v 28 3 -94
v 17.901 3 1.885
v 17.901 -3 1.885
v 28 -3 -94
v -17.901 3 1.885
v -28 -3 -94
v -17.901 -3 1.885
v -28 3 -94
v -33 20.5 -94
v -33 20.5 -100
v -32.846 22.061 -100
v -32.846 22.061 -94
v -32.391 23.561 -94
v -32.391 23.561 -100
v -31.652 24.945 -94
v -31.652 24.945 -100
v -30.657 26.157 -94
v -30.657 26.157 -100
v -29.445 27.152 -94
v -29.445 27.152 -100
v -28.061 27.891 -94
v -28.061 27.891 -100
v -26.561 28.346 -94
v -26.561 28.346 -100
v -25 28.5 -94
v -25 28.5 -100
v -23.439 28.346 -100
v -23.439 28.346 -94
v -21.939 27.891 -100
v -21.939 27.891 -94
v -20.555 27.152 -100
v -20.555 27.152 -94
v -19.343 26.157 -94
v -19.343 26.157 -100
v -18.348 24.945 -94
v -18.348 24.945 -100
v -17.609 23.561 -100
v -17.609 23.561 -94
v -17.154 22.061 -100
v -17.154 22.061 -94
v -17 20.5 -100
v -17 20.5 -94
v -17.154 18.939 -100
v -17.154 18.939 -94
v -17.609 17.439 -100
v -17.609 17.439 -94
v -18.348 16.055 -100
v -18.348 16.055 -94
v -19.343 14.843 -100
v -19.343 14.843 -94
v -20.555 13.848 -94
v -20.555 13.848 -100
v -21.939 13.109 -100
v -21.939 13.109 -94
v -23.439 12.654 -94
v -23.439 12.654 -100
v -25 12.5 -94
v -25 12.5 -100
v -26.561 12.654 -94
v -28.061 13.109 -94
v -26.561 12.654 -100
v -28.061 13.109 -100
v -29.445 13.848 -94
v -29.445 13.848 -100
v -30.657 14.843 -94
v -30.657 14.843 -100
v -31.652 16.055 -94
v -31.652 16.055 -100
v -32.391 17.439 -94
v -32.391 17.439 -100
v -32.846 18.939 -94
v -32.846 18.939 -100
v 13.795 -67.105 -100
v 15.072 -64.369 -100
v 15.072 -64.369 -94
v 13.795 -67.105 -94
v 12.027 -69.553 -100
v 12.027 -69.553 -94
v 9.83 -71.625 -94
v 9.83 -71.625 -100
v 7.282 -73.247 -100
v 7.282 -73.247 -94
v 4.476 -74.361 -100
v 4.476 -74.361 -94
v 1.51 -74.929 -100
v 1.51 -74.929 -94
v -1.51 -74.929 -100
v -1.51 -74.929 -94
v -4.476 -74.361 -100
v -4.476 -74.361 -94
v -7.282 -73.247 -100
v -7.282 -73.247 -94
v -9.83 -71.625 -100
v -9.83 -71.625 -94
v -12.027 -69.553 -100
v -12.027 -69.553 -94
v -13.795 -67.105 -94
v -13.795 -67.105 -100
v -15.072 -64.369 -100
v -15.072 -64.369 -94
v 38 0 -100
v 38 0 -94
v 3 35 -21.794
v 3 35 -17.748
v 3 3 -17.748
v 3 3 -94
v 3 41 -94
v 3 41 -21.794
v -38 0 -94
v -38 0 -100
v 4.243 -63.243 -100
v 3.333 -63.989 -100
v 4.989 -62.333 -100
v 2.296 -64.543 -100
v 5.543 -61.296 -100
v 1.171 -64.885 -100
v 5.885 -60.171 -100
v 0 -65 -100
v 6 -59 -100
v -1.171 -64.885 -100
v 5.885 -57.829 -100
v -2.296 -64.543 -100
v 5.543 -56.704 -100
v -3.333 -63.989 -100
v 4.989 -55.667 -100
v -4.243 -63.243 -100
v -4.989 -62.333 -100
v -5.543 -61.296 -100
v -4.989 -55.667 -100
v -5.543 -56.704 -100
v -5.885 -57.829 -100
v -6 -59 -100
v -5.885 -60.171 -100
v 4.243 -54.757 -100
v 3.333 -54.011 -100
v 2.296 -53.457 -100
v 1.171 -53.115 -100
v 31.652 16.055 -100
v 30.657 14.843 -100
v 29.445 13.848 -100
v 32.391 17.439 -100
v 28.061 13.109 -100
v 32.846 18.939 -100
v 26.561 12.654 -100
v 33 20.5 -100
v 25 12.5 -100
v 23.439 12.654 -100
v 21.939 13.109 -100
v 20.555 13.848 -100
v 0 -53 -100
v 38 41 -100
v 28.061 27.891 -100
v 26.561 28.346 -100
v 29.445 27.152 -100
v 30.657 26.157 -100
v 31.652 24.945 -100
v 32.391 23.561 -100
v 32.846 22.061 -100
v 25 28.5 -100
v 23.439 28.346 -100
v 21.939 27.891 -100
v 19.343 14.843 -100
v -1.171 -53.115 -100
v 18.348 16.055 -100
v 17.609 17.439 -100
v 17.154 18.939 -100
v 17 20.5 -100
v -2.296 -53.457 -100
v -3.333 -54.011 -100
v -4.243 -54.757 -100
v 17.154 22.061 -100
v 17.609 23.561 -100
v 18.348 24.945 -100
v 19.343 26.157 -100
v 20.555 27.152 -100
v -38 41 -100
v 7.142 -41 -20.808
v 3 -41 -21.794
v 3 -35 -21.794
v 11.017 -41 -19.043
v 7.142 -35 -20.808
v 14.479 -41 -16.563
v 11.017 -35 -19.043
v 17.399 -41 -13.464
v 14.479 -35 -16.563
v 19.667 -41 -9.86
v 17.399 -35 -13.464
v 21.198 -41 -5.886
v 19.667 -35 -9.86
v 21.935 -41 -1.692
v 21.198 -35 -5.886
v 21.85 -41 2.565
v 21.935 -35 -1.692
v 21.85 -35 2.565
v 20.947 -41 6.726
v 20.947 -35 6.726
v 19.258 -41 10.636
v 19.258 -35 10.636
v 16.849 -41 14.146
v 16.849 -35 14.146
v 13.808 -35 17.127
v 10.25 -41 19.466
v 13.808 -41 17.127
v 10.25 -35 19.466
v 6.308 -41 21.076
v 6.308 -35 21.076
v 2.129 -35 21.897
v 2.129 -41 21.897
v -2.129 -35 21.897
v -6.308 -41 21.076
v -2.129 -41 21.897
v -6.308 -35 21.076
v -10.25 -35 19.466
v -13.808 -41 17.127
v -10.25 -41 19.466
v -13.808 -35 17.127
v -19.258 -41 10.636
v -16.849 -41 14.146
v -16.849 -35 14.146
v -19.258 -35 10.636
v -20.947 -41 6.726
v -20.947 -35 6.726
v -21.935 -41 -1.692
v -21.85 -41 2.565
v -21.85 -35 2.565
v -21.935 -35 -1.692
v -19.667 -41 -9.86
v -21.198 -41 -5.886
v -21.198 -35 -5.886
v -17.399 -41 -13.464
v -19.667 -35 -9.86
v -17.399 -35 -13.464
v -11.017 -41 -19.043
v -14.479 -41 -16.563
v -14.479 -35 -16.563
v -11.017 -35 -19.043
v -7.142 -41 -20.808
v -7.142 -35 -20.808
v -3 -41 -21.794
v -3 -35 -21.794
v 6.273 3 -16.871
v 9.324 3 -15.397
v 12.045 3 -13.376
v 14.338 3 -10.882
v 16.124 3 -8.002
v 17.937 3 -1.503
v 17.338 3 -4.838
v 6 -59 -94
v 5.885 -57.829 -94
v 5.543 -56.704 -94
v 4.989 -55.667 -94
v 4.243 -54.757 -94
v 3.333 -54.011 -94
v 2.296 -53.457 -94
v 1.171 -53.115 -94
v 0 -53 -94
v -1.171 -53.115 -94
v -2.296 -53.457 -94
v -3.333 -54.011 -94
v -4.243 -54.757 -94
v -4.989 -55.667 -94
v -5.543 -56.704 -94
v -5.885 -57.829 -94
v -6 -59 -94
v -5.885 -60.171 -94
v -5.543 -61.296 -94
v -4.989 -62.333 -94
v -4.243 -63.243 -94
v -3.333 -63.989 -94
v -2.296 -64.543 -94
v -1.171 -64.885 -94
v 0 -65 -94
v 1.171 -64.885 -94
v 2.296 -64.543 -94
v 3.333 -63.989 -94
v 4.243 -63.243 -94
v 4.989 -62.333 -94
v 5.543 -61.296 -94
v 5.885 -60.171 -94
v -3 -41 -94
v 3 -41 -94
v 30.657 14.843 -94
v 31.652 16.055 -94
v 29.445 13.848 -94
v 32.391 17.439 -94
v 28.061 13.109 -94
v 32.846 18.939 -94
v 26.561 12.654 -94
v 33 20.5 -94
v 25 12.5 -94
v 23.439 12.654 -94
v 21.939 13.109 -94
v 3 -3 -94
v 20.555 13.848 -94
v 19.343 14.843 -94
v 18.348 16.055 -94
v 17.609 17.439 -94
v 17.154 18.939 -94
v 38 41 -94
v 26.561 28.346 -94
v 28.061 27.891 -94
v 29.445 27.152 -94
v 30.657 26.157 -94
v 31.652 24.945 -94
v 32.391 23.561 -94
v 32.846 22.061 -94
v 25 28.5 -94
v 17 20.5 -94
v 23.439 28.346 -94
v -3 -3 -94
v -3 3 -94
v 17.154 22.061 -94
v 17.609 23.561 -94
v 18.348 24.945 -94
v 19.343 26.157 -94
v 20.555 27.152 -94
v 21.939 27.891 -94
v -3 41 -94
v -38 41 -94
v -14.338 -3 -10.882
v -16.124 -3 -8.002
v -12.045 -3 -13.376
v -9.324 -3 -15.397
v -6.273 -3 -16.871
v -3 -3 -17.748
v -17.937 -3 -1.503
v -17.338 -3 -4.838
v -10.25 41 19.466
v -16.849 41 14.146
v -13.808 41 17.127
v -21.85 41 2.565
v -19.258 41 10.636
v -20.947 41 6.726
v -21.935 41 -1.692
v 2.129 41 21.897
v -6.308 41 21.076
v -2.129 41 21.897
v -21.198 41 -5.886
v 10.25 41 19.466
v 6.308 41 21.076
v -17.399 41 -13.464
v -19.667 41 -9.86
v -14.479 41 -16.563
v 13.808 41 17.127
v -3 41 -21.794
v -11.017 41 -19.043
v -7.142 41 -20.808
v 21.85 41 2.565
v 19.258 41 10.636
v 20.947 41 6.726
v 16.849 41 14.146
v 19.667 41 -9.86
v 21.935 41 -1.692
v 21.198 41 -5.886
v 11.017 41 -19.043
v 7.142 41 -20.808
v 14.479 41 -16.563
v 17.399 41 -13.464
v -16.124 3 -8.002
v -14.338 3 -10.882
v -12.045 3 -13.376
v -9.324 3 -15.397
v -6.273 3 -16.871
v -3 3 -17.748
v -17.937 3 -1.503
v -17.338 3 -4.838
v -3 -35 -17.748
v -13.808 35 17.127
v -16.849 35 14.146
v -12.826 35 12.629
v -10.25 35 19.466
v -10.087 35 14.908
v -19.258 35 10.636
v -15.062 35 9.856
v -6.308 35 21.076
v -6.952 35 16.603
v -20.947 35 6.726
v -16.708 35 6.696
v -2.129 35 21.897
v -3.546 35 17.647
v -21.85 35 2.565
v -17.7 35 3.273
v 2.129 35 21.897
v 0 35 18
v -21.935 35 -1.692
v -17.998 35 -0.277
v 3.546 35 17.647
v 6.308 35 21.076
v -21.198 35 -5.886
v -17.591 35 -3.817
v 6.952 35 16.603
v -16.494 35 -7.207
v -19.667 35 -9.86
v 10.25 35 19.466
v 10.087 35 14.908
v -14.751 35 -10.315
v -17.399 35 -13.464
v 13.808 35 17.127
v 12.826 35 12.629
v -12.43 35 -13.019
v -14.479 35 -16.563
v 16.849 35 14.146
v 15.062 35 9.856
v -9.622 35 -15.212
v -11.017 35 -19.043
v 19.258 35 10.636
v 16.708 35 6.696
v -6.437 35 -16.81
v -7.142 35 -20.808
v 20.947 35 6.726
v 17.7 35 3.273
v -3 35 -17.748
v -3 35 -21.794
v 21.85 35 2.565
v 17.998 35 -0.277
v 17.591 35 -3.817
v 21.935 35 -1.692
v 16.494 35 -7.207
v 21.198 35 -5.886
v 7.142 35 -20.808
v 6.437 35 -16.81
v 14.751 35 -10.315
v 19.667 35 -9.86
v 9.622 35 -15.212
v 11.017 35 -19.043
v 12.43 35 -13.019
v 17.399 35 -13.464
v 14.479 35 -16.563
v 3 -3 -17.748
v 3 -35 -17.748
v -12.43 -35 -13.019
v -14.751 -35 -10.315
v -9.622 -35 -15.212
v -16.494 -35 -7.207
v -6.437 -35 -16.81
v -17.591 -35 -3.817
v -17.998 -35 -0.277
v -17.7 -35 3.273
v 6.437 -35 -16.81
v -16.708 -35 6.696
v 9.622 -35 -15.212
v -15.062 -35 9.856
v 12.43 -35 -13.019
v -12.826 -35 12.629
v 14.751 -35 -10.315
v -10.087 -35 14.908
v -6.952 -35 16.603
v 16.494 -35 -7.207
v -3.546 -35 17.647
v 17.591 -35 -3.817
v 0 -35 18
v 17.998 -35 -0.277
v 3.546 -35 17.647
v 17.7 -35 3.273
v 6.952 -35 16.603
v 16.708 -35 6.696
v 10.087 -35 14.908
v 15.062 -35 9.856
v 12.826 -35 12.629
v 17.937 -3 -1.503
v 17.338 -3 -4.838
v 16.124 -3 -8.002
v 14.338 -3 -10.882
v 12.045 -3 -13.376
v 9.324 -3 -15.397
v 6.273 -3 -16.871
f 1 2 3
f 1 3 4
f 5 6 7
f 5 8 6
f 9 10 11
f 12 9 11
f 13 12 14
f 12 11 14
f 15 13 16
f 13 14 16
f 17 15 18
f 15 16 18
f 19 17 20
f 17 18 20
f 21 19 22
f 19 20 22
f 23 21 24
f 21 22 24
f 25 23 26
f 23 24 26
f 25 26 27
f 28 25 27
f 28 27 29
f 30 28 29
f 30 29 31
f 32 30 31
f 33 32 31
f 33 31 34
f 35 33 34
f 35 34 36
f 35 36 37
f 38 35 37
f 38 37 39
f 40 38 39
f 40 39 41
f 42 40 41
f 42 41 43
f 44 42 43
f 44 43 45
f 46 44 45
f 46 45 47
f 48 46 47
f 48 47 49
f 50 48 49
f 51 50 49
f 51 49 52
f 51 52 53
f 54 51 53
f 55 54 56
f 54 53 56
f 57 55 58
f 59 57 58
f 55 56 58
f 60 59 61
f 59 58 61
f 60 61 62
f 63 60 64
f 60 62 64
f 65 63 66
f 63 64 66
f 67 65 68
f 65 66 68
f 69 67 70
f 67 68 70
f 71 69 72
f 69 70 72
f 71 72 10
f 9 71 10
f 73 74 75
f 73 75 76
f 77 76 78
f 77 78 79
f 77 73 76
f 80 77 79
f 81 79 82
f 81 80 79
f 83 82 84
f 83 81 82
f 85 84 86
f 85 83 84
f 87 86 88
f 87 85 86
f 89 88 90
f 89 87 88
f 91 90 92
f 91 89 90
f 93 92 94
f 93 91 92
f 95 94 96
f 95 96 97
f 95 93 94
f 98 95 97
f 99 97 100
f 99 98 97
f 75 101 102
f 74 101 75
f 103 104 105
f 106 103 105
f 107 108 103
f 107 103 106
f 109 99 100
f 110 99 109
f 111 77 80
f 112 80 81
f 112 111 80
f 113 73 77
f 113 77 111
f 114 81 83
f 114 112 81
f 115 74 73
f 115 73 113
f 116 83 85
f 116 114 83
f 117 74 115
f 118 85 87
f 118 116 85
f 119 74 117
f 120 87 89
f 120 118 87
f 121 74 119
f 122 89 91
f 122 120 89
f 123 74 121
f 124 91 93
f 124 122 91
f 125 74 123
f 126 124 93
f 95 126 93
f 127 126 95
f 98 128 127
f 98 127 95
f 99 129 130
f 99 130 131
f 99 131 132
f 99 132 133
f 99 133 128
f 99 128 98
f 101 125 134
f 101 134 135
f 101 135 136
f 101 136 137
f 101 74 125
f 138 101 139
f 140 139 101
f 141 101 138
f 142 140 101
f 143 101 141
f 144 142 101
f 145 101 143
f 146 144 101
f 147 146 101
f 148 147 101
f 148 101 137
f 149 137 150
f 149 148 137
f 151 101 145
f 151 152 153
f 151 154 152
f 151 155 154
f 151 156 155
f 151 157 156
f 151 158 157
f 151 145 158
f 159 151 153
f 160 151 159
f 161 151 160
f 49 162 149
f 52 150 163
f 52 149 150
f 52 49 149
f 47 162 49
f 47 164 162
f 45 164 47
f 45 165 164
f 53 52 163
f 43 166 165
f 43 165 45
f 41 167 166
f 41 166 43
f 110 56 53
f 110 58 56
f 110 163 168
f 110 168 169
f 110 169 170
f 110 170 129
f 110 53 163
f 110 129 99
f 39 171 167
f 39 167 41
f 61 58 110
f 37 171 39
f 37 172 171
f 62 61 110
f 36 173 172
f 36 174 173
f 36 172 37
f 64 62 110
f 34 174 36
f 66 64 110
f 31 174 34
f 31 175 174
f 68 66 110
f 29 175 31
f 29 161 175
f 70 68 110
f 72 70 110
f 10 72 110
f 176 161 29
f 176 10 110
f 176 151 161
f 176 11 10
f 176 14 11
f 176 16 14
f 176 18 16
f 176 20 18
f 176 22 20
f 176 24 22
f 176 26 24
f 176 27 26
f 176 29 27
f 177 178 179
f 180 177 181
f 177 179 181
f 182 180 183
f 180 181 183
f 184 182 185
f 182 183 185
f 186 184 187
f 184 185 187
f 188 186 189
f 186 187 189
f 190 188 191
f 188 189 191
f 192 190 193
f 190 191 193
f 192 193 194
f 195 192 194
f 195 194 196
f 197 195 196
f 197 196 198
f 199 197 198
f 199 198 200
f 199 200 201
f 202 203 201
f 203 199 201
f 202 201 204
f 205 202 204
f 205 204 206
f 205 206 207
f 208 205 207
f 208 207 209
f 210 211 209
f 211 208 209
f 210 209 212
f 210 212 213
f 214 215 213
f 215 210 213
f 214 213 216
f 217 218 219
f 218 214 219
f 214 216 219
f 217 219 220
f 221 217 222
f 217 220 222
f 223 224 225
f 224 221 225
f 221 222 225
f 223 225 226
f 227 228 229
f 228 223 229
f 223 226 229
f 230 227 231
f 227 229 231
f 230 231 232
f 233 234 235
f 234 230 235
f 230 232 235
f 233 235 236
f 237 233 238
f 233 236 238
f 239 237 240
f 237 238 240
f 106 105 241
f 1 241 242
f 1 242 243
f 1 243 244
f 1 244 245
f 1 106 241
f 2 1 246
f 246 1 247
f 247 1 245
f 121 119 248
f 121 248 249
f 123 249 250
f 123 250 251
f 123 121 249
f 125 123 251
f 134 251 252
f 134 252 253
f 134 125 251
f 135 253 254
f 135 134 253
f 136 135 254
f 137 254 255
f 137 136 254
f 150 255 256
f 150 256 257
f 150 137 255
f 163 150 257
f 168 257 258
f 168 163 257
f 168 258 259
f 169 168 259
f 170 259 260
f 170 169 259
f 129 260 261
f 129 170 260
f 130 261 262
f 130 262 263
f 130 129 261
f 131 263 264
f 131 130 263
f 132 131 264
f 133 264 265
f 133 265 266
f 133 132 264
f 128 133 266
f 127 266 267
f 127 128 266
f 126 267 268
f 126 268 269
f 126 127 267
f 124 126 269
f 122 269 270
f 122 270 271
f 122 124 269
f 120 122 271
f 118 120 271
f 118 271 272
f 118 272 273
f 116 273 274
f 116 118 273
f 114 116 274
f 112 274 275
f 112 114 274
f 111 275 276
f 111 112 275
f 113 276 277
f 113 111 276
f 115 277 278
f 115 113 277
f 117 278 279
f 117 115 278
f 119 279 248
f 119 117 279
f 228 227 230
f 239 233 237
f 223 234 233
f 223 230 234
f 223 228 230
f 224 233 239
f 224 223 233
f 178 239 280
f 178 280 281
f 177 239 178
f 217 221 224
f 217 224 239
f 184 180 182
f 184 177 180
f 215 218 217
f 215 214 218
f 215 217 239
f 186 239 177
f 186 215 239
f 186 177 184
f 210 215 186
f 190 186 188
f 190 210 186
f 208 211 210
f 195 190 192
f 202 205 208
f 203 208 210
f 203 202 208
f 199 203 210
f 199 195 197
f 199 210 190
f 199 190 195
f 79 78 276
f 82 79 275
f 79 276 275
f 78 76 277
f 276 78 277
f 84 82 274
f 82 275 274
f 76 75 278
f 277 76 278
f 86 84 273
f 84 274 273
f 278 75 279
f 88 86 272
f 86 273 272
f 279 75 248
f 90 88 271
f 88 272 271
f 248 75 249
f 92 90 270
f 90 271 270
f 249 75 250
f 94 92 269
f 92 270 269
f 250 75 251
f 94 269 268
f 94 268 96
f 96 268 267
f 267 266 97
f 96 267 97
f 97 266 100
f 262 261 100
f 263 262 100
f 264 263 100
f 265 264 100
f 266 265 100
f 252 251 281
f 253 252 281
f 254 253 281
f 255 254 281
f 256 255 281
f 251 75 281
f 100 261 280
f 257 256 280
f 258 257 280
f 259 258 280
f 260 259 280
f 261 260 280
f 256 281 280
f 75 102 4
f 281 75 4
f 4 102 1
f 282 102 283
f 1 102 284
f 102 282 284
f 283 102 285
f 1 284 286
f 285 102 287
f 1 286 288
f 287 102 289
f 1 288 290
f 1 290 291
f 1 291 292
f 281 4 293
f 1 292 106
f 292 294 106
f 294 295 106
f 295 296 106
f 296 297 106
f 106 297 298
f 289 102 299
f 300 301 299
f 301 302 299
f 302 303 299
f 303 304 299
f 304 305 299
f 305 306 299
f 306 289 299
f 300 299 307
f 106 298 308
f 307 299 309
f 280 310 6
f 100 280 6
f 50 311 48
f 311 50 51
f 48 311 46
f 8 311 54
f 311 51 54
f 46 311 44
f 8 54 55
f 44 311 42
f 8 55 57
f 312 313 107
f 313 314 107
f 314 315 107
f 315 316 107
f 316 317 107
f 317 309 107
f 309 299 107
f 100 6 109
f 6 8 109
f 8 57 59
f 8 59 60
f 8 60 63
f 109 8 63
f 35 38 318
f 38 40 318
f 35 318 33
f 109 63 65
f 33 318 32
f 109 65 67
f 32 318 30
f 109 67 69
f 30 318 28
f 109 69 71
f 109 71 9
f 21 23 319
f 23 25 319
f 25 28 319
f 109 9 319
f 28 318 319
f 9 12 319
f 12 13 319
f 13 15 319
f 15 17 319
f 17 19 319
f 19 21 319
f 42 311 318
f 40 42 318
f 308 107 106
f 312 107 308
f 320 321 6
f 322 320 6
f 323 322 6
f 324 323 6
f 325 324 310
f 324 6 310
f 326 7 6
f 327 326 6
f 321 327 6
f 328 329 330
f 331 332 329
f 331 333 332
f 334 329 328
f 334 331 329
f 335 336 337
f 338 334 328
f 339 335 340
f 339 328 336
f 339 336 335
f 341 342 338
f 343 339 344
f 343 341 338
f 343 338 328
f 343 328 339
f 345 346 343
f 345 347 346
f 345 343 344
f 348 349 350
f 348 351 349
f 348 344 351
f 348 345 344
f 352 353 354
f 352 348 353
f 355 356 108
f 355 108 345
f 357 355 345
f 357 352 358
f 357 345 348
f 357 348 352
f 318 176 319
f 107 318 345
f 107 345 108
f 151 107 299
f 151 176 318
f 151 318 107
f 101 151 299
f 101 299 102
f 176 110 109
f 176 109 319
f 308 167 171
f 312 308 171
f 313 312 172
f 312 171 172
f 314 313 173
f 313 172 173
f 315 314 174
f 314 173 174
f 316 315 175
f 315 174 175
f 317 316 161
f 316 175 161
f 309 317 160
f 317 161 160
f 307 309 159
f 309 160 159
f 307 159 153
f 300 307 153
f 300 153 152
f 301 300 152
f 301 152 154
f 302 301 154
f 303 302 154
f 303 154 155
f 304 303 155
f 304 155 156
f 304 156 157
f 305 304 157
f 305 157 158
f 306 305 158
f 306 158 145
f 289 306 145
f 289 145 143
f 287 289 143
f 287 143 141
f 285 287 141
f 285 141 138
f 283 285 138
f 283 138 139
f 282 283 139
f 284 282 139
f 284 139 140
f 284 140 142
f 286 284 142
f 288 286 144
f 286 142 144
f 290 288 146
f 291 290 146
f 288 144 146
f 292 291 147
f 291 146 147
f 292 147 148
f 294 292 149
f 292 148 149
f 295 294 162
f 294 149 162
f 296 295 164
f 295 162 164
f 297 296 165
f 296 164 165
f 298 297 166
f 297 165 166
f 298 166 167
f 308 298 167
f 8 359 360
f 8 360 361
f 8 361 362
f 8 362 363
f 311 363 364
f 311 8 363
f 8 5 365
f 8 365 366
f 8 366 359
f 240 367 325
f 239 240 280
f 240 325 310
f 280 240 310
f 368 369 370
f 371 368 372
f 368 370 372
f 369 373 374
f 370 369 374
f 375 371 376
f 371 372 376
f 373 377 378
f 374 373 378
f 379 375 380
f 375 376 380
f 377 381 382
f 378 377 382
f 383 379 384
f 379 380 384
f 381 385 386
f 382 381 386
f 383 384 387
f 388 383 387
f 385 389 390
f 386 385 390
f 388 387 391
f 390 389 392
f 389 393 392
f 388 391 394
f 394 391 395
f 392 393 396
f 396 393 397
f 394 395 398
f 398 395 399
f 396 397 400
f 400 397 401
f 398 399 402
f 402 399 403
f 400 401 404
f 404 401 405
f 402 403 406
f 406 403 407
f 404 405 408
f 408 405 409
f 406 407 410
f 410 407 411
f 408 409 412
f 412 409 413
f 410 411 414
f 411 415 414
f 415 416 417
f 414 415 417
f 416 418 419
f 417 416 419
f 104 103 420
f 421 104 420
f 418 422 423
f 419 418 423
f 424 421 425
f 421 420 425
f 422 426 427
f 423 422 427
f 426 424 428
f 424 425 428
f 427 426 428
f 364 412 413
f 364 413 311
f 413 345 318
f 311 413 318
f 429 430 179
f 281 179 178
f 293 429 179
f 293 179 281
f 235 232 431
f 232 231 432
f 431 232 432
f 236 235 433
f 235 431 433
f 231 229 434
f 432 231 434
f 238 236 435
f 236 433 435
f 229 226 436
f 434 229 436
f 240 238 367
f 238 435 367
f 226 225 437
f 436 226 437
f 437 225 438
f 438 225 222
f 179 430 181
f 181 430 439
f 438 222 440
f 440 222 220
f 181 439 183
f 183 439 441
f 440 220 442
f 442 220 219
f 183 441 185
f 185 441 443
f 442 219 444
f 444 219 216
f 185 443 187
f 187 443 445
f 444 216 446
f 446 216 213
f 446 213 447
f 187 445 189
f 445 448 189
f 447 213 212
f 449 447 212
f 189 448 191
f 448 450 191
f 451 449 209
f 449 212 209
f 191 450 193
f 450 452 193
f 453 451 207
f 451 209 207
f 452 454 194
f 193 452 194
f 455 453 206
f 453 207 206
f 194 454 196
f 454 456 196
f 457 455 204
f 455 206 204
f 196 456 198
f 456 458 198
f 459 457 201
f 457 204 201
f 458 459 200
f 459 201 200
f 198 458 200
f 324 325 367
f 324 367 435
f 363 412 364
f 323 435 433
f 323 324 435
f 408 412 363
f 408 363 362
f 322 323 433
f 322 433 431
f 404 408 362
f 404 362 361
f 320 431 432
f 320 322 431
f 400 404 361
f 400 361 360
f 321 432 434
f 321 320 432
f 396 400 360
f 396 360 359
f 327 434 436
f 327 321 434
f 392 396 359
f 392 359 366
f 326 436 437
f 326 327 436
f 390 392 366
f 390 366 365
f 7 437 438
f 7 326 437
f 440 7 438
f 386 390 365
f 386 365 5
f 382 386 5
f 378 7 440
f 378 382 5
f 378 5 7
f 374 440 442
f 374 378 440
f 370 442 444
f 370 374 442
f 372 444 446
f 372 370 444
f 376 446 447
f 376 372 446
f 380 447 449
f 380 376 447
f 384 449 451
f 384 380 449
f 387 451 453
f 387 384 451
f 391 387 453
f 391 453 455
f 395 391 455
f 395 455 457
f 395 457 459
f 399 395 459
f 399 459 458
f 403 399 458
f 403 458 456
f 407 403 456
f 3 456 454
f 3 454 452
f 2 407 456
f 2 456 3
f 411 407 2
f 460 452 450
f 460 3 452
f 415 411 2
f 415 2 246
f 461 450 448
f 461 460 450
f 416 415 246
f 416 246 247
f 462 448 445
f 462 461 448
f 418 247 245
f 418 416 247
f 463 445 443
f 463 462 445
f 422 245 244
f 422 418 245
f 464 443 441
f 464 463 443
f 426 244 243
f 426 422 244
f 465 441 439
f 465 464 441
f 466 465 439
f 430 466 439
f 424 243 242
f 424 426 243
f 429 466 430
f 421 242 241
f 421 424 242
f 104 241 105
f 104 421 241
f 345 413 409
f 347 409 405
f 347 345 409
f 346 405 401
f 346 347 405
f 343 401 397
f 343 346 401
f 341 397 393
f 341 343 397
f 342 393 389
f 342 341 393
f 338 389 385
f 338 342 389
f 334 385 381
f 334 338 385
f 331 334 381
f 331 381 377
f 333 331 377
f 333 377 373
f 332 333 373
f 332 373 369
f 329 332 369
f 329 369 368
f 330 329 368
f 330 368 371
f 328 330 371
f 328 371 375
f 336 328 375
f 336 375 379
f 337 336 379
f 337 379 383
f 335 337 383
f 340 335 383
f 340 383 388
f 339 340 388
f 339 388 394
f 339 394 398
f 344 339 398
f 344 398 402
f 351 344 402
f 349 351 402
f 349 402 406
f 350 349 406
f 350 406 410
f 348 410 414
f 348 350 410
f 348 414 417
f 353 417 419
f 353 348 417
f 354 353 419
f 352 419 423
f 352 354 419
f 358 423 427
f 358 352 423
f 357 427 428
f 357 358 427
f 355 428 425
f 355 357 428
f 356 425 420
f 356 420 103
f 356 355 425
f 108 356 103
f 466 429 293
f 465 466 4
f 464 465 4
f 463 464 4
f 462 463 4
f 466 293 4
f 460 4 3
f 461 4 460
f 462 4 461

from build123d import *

# Parameters (mm, degrees)
SKETCH1_R           = 18
BOSS_EXTRUDE1_DEPTH = 41
SKETCH3_R           = 6
BOSS_EXTRUDE2_DEPTH = 6
SKETCH4_W           = 81
SKETCH4_H           = 82
BOSS_EXTRUDE3_DEPTH = 3
SKETCH6_R           = 22
BOSS_EXTRUDE4_DEPTH = 6
BOSS_EXTRUDE5_START = -6
SKETCH7_R           = 22
BOSS_EXTRUDE5_DEPTH = 6
BOSS_EXTRUDE6_DEPTH = 3
HOLE1_D             = 16
HOLE1_DEPTH         = 6


with BuildPart() as part:
    # Sketch1 → Boss-Extrude1 (new, symmetric)
    with BuildSketch(Plane(origin=(0, 0, 0), x_dir=(1, 0, 0), z_dir=(0, 1, 0))):
        with Locations(Location((0, 0, 0), (0, 0, 270))):
            Circle(SKETCH1_R)
    extrude(amount=BOSS_EXTRUDE1_DEPTH, both=True)



with BuildPart() as body_2:
    # Sketch3 → Boss-Extrude2 (new body)
    with BuildSketch(Plane.XY.offset(-100)):
        with BuildLine():
            Line((-38, 41), (38, 41))
            Line((38, 41), (38, 0))
            Line((38, 0), (15.072405416, -64.368667895))
            ThreePointArc((15.072405416, -64.368667895), (0, -75), (-15.072405416, -64.368667895))
            Line((-15.072405416, -64.368667895), (-38, 0))
            Line((-38, 0), (-38, 41))
        make_face()
        with Locations((0, -59)):
            Circle(SKETCH3_R, mode=Mode.SUBTRACT)
    extrude(amount=BOSS_EXTRUDE2_DEPTH)


with BuildPart() as part_1:
    add(part.part)

    add(body_2.part)  # Boss-Extrude3 merges body 2
    # Sketch4 → Boss-Extrude3 (add, symmetric)
    with BuildSketch(Plane(origin=(0, 0, 0), x_dir=(0, 0, -1), z_dir=(1, 0, 0))):
        with Locations((53.5, 0)):
            Rectangle(SKETCH4_W, SKETCH4_H)
    extrude(amount=BOSS_EXTRUDE3_DEPTH, both=True)

    # Sketch6 → Boss-Extrude4 (add)
    with BuildSketch(Plane(origin=(0, 41, 0), x_dir=(1, 0, 0), z_dir=(0, 1, 0))):
        Circle(SKETCH6_R)
    extrude(amount=-BOSS_EXTRUDE4_DEPTH)

    # Sketch7 → Boss-Extrude5 (add)
    with BuildSketch(Plane.XZ.offset(41).offset(BOSS_EXTRUDE5_START)):
        Circle(SKETCH7_R)
    extrude(amount=BOSS_EXTRUDE5_DEPTH)

    # Sketch8 → Boss-Extrude6 (add, symmetric)
    with BuildSketch(Plane(origin=(0, 0, 0), x_dir=(1, 0, 0), z_dir=(0, 1, 0))):
        with BuildLine():
            Line((-28, 94), (-17.900985099, -1.885399817))
            ThreePointArc((-17.900985099, -1.885399817), (0, 18), (17.900985099, -1.885399817))
            Line((17.900985099, -1.885399817), (28, 94))
            Line((28, 94), (-28, 94))
        make_face()
    extrude(amount=BOSS_EXTRUDE6_DEPTH, both=True)

    # Hole1
    with Locations(Plane.XY.offset(-94)):
        with Locations((25, 20.5), (-25, 20.5)):
            Hole(HOLE1_D / 2, depth=HOLE1_DEPTH)


solid = part_1.part
